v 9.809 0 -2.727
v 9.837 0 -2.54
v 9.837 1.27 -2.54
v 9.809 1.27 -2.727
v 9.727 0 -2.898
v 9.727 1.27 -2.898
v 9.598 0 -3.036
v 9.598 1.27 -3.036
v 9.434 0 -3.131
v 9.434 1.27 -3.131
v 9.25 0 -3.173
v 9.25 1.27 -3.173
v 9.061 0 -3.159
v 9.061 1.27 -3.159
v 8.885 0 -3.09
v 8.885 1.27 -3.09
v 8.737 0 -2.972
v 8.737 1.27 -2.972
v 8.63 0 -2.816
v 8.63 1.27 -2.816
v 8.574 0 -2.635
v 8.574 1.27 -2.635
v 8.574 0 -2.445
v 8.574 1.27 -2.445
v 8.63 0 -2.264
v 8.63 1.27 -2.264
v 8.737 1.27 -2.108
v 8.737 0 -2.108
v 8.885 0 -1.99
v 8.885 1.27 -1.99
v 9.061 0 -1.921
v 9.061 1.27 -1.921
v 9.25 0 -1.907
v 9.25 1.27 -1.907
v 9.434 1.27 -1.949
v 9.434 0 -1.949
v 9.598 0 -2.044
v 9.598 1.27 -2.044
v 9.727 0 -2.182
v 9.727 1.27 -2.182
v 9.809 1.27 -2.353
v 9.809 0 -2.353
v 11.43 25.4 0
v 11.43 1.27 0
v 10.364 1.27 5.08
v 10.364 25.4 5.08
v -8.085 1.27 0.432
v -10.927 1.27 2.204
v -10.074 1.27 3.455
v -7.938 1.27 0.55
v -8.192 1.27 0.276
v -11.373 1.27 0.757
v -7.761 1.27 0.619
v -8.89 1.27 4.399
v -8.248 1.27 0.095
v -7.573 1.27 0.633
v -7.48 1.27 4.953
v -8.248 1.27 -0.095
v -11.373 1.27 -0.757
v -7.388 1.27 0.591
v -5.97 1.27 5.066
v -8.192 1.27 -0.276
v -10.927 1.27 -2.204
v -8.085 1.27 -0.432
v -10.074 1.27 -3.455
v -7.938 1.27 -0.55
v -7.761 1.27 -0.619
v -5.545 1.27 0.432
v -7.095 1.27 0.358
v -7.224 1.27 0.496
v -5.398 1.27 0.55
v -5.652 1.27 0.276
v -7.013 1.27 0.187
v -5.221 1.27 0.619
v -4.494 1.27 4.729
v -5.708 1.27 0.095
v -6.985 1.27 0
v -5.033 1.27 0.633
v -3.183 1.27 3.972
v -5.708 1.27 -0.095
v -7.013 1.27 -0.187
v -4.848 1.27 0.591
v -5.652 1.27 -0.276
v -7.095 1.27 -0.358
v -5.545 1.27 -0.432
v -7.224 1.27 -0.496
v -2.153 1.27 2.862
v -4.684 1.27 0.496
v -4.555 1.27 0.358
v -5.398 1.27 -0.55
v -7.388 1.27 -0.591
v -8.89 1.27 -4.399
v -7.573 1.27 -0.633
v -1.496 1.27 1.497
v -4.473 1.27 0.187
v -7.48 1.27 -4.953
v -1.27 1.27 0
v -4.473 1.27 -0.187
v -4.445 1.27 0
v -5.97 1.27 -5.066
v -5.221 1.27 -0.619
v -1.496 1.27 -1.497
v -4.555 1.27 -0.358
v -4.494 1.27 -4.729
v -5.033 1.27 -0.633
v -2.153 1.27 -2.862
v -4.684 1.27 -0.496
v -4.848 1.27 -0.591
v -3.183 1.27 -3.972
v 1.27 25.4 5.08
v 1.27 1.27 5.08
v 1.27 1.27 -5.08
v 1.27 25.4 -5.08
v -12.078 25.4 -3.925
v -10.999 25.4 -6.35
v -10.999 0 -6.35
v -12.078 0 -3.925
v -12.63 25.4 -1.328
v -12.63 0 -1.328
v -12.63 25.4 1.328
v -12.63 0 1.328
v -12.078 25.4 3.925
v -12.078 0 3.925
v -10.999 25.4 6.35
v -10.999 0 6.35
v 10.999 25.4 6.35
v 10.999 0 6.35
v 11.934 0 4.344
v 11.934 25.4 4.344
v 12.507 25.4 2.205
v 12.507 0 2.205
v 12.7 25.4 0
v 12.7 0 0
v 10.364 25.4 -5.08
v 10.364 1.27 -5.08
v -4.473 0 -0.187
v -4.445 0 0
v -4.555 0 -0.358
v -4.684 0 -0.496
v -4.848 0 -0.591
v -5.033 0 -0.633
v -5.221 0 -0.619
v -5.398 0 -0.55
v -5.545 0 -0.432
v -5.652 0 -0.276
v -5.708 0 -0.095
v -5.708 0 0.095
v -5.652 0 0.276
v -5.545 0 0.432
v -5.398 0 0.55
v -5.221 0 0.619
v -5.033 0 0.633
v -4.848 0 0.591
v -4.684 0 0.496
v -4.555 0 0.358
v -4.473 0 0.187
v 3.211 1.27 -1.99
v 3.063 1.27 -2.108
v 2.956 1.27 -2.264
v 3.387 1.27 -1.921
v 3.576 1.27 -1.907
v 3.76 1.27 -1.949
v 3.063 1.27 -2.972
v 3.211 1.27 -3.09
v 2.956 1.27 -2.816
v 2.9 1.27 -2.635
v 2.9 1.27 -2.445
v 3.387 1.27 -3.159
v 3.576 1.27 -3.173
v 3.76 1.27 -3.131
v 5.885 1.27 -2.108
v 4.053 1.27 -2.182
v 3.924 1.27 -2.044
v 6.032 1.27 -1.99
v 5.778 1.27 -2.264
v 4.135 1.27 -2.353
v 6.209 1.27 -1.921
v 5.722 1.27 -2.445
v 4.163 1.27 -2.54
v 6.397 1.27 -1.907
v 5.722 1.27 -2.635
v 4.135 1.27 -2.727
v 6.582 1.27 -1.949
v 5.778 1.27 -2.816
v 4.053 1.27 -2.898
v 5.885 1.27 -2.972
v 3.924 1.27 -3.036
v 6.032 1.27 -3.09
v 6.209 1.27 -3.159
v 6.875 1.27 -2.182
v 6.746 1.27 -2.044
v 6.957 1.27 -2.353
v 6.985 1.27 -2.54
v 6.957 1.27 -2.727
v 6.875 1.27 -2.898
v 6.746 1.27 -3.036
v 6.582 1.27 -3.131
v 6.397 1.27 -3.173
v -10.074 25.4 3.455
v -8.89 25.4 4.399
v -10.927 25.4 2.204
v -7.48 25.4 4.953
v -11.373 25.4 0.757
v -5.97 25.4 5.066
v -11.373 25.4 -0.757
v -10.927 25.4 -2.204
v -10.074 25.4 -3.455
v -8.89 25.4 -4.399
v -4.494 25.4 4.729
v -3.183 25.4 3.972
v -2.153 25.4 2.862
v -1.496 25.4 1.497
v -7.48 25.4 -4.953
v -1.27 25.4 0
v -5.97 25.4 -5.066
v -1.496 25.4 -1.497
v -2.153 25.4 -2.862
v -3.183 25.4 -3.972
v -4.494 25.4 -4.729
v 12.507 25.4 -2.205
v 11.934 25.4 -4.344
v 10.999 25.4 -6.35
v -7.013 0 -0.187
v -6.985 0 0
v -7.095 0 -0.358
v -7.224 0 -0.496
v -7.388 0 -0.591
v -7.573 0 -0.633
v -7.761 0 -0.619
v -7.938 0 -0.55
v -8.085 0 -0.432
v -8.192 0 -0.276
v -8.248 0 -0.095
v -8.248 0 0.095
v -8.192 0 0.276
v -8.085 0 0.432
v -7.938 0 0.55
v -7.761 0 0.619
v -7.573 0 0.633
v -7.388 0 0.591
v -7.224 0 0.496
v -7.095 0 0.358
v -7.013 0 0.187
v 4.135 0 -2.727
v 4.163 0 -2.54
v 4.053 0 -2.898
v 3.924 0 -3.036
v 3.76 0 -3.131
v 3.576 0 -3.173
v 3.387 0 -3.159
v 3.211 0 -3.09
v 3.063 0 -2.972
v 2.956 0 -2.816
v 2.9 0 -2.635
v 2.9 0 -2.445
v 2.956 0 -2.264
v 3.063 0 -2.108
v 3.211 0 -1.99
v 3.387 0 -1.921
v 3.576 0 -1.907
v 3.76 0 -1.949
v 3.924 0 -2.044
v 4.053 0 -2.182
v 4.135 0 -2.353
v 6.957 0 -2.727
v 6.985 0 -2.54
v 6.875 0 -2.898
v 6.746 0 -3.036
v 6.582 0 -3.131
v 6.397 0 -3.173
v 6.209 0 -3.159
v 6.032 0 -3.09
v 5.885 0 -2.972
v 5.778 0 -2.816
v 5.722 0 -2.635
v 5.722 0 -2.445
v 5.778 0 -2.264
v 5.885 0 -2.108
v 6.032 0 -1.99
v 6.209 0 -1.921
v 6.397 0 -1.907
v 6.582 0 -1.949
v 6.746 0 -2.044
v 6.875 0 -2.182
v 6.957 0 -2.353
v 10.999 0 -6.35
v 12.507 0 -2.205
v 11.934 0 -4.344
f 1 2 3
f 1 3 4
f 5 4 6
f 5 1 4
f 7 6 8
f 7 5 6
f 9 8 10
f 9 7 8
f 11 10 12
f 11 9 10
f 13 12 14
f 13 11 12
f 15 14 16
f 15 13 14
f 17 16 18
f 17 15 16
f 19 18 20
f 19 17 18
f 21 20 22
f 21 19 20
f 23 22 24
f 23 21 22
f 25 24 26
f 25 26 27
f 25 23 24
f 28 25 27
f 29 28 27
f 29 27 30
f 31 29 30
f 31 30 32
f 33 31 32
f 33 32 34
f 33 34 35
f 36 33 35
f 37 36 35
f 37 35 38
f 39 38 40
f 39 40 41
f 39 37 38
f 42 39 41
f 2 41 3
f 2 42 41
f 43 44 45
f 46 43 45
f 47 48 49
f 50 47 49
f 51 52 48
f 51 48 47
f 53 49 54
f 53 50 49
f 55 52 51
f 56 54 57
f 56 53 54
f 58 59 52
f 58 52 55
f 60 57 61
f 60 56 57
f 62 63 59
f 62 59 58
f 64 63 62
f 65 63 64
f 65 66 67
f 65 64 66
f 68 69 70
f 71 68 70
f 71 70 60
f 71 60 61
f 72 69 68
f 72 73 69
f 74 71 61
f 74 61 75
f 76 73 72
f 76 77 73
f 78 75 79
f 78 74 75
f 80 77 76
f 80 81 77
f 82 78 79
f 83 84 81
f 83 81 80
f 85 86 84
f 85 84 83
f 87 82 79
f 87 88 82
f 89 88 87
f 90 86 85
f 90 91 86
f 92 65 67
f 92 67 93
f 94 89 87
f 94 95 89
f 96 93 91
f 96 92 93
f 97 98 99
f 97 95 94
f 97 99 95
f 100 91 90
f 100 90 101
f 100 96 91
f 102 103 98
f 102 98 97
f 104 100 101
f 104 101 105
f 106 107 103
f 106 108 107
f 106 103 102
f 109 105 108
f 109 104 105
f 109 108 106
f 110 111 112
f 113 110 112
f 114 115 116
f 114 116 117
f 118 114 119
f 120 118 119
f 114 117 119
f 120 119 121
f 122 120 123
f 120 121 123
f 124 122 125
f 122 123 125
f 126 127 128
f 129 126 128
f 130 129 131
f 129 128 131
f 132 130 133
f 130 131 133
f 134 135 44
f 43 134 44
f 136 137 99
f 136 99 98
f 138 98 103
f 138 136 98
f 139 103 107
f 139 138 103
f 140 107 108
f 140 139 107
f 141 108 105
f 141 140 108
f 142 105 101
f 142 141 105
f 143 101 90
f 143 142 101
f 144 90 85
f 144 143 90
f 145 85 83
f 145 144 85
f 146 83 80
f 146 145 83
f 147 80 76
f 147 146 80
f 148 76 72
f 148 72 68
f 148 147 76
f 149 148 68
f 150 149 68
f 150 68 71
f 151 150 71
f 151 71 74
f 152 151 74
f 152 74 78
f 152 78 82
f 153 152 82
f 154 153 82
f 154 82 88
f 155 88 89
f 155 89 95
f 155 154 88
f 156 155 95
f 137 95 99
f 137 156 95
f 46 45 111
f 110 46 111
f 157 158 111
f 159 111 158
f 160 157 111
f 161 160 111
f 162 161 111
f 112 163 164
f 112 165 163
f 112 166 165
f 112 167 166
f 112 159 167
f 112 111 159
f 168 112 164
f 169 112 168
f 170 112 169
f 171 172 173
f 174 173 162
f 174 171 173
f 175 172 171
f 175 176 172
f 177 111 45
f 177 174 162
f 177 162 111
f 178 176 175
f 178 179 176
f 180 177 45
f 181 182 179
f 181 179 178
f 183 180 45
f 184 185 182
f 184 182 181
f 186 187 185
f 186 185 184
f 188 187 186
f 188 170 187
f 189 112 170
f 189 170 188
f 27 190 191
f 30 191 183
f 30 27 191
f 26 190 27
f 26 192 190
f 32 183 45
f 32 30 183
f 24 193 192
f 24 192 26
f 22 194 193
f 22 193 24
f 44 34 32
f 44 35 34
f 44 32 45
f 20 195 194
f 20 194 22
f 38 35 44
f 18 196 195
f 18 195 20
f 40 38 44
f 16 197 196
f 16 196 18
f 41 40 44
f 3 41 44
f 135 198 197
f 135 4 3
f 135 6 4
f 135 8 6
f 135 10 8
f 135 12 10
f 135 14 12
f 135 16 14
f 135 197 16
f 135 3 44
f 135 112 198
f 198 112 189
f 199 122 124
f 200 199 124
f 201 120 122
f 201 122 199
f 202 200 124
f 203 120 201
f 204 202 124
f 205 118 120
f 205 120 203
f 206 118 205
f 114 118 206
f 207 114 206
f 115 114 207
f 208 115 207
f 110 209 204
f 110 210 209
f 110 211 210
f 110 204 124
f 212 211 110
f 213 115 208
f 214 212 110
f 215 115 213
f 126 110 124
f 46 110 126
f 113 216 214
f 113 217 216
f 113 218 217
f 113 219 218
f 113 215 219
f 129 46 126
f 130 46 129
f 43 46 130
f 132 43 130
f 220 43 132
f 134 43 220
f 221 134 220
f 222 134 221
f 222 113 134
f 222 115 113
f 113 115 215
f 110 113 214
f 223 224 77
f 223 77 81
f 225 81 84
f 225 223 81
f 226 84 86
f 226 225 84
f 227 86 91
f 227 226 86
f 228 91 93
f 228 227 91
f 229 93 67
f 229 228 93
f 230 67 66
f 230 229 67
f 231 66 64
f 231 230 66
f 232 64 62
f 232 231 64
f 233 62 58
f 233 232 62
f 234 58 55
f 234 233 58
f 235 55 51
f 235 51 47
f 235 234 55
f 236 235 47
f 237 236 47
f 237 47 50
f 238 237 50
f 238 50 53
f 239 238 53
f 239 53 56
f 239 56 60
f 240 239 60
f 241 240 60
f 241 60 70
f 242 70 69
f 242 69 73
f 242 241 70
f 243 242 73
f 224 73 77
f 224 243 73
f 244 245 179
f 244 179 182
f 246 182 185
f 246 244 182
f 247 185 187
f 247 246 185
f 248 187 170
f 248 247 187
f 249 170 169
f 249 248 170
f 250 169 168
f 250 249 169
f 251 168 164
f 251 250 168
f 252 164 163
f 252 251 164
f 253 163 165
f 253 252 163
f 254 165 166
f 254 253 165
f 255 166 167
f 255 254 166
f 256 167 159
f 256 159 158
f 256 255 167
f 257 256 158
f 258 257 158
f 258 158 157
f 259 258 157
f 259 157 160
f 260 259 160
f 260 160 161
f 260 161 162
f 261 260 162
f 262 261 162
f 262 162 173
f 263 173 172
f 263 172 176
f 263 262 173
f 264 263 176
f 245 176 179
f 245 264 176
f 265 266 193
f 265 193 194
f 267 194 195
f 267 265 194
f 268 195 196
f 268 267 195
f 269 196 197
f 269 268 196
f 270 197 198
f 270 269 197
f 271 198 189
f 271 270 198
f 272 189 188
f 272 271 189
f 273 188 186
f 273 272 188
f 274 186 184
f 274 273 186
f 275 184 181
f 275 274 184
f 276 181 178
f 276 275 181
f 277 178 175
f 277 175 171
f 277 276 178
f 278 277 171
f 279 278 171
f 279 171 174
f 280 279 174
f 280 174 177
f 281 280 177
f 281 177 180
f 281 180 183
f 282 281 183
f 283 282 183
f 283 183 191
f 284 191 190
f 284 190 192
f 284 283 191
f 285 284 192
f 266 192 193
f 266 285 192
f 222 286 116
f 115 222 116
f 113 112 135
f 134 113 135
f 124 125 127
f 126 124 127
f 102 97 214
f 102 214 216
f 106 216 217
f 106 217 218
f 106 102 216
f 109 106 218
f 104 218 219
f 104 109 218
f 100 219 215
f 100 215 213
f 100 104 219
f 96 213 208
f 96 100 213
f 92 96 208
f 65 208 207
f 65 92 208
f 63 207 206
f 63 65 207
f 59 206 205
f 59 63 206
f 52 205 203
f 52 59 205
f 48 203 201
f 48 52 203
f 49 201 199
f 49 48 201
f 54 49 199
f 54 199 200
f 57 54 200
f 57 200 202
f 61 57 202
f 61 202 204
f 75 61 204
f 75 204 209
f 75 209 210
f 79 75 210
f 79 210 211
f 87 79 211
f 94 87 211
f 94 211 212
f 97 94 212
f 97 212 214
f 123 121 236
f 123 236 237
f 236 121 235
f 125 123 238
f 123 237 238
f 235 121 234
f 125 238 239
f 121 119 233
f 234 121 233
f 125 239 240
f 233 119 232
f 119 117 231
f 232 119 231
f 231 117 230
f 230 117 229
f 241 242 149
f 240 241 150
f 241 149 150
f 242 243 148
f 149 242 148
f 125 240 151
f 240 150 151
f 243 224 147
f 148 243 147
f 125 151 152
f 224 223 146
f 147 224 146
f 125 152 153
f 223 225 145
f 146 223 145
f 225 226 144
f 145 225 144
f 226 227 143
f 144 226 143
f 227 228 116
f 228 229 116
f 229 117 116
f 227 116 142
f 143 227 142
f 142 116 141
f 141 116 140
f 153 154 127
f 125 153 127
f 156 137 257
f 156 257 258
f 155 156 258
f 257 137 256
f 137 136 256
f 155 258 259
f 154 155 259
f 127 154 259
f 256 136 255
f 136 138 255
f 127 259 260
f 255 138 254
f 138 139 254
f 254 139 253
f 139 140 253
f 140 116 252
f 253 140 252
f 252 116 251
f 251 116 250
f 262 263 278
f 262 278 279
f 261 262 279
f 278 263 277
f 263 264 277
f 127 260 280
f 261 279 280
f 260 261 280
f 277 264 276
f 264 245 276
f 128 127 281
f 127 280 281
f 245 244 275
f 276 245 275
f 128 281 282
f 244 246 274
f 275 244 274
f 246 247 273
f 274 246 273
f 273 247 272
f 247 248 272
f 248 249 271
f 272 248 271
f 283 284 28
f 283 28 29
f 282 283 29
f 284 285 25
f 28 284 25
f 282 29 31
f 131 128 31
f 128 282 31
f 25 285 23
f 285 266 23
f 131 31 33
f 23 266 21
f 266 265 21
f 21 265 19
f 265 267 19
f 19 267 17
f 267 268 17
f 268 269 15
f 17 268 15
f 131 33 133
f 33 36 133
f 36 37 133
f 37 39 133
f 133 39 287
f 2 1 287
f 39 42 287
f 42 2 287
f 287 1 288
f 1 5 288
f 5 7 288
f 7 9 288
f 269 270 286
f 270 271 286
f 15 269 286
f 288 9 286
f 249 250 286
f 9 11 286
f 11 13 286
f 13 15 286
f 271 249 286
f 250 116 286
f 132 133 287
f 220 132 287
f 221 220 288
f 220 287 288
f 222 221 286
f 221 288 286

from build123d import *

# Parameters (mm, degrees)
SKETCH1_R           = 5.08
BOSS_EXTRUDE4_DEPTH = 25.4
SKETCH1_9_R         = 0.635
SKETCH1_9_R_2       = 5.08
BOSS_EXTRUDE5_DEPTH = 1.27


with BuildPart() as part:
    # Sketch1 → Boss-Extrude4 (new body)
    with BuildSketch(Plane(origin=(0, 0, 0), x_dir=(1, 0, 0), z_dir=(0, 1, 0))):
        with BuildLine():
            Line((10.998522628, 6.35), (-7.775388174, 6.35))
            Line((-7.775388174, 6.35), (-10.998522628, 6.35))
            ThreePointArc((-10.998522628, 6.35), (-12.7, 0), (-10.998522628, -6.35))
            Line((-10.998522628, -6.35), (10.998522628, -6.35))
            ThreePointArc((10.998522628, -6.35), (12.267257994, -3.287001873), (12.7, 0))
            ThreePointArc((12.7, 0), (12.267257994, 3.287001873), (10.998522628, 6.35))
        make_face()
        with Locations((-6.35, 0)):
            Circle(SKETCH1_R, mode=Mode.SUBTRACT)
        Polygon((1.27, -5.08), (1.27, 0), (1.27, 5.08), (10.363946118, 5.08), (11.43, 0), (10.363946118, -5.08), align=None, mode=Mode.SUBTRACT)
    extrude(amount=BOSS_EXTRUDE4_DEPTH)

    # Sketch1<9> → Boss-Extrude5 (add)
    # profile 1 of 2: a face of its own
    with BuildSketch(Plane(origin=(0, 0, 0), x_dir=(1, 0, 0), z_dir=(0, 1, 0))):
        Polygon((1.27, 5.08), (1.27, -5.08), (10.363946118, -5.08), (11.43, 0), (10.363946118, 5.08), align=None)
        with Locations((3.528103699, 2.54)):
            Circle(SKETCH1_9_R, mode=Mode.SUBTRACT)
        with Locations((6.35, 2.54)):
            Circle(SKETCH1_9_R, mode=Mode.SUBTRACT)
        with Locations((9.202180779, 2.54)):
            Circle(SKETCH1_9_R, mode=Mode.SUBTRACT)
    # profile 2 of 2: a face of its own
    with BuildSketch(Plane(origin=(0, 0, 0), x_dir=(1, 0, 0), z_dir=(0, 1, 0))):
        with Locations((-6.35, 0)):
            Circle(SKETCH1_9_R_2)
        with Locations((-7.62, 0)):
            Circle(SKETCH1_9_R, mode=Mode.SUBTRACT)
        with Locations((-5.08, 0)):
            Circle(SKETCH1_9_R, mode=Mode.SUBTRACT)
    extrude(amount=BOSS_EXTRUDE5_DEPTH)


solid = part.part
